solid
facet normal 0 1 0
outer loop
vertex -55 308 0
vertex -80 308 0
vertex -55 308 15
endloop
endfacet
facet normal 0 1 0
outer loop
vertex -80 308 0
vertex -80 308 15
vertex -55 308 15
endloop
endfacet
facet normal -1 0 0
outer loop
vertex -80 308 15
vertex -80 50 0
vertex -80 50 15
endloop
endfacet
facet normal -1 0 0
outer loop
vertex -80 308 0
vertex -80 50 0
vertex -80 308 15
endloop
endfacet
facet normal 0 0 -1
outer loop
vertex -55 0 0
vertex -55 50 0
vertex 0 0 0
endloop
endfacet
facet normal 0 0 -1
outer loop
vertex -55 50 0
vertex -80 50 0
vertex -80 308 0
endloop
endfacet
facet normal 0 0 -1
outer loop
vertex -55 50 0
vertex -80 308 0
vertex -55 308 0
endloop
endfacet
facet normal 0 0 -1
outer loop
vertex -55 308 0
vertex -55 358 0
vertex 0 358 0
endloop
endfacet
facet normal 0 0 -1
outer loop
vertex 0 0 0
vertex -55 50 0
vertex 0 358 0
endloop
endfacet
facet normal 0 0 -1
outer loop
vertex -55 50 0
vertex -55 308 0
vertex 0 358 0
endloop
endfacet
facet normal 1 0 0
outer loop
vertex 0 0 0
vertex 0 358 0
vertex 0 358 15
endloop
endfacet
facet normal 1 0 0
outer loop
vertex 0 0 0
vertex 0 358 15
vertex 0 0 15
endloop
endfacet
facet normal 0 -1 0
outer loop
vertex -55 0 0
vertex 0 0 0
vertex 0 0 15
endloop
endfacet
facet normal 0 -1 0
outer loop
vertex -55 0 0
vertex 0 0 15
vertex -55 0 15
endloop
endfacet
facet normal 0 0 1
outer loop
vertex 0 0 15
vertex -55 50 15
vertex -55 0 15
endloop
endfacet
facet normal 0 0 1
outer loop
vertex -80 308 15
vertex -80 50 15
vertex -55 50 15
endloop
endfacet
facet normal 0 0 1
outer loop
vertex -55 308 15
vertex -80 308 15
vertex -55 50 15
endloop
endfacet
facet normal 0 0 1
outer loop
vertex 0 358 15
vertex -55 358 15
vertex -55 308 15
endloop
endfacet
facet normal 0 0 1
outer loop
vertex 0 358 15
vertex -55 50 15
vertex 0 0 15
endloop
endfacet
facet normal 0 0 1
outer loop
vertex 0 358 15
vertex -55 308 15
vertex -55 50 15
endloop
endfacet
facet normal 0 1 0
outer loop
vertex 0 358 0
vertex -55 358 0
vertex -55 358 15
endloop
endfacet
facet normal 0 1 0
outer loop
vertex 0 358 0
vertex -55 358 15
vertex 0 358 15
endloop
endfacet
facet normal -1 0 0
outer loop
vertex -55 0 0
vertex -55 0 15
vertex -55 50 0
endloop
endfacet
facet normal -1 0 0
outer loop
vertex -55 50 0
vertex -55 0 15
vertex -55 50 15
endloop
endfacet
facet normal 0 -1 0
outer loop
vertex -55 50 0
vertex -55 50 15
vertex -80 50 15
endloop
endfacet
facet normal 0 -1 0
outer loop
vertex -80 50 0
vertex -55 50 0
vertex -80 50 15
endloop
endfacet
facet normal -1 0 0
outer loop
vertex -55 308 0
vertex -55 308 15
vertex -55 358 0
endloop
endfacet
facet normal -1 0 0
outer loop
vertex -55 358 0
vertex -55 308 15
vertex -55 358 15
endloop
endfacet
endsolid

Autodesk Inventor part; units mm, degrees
ref_plane "YZ Plane" through (0, 0, 0) normal (1, 0, 0) x (0, 1, 0)
ref_plane "XZ Plane" through (0, 0, 0) normal (0, 1, 0) x (-1, 0, 0)
ref_plane "XY Plane" through (0, 0, 0) normal (0, 0, 1) x (1, 0, 0)
sketch "Sketch1" plane through (0, 0, 0) normal (0, 0, 1) x (1, 0, 0)
  line L0 (0, 0) -> (-80, 0)
  line L1 (-80, 0) -> (-80, 358)
  line L2 (-80, 358) -> (0, 358)
  line L3 (0, 358) -> (0, 0)
  dimension "d0" = 80
  dimension "d1" = 358
extrude "Extrusion1" add sketch "Sketch1" along normal blind 15
sketch "Sketch2" plane through (0, 0, 15) normal (0, 0, 1) x (1, 0, 0)
  line L0 (-80, 0) -> (0, 0) projected
  line L1 (-80, 0) -> (-55, 0)
  line L2 (-55, 0) -> (-55, 50)
  line L3 (-55, 50) -> (-80, 50)
  line L4 (-80, 50) -> (-80, 0)
  dimension "d4" = 25
  dimension "d5" = 50
extrude "Extrusion2" cut sketch "Sketch2" against normal through all
ref_plane "Work Plane1" through (0, 179, 0) normal (0, -1, 0) x (1, 0, 0)
mirror "Mirror1" about plane through (0, 179, 0) normal (0, -1, 0) of "Extrusion2"
properties part number "MPX-rib" material "Wood (Cherry)"
